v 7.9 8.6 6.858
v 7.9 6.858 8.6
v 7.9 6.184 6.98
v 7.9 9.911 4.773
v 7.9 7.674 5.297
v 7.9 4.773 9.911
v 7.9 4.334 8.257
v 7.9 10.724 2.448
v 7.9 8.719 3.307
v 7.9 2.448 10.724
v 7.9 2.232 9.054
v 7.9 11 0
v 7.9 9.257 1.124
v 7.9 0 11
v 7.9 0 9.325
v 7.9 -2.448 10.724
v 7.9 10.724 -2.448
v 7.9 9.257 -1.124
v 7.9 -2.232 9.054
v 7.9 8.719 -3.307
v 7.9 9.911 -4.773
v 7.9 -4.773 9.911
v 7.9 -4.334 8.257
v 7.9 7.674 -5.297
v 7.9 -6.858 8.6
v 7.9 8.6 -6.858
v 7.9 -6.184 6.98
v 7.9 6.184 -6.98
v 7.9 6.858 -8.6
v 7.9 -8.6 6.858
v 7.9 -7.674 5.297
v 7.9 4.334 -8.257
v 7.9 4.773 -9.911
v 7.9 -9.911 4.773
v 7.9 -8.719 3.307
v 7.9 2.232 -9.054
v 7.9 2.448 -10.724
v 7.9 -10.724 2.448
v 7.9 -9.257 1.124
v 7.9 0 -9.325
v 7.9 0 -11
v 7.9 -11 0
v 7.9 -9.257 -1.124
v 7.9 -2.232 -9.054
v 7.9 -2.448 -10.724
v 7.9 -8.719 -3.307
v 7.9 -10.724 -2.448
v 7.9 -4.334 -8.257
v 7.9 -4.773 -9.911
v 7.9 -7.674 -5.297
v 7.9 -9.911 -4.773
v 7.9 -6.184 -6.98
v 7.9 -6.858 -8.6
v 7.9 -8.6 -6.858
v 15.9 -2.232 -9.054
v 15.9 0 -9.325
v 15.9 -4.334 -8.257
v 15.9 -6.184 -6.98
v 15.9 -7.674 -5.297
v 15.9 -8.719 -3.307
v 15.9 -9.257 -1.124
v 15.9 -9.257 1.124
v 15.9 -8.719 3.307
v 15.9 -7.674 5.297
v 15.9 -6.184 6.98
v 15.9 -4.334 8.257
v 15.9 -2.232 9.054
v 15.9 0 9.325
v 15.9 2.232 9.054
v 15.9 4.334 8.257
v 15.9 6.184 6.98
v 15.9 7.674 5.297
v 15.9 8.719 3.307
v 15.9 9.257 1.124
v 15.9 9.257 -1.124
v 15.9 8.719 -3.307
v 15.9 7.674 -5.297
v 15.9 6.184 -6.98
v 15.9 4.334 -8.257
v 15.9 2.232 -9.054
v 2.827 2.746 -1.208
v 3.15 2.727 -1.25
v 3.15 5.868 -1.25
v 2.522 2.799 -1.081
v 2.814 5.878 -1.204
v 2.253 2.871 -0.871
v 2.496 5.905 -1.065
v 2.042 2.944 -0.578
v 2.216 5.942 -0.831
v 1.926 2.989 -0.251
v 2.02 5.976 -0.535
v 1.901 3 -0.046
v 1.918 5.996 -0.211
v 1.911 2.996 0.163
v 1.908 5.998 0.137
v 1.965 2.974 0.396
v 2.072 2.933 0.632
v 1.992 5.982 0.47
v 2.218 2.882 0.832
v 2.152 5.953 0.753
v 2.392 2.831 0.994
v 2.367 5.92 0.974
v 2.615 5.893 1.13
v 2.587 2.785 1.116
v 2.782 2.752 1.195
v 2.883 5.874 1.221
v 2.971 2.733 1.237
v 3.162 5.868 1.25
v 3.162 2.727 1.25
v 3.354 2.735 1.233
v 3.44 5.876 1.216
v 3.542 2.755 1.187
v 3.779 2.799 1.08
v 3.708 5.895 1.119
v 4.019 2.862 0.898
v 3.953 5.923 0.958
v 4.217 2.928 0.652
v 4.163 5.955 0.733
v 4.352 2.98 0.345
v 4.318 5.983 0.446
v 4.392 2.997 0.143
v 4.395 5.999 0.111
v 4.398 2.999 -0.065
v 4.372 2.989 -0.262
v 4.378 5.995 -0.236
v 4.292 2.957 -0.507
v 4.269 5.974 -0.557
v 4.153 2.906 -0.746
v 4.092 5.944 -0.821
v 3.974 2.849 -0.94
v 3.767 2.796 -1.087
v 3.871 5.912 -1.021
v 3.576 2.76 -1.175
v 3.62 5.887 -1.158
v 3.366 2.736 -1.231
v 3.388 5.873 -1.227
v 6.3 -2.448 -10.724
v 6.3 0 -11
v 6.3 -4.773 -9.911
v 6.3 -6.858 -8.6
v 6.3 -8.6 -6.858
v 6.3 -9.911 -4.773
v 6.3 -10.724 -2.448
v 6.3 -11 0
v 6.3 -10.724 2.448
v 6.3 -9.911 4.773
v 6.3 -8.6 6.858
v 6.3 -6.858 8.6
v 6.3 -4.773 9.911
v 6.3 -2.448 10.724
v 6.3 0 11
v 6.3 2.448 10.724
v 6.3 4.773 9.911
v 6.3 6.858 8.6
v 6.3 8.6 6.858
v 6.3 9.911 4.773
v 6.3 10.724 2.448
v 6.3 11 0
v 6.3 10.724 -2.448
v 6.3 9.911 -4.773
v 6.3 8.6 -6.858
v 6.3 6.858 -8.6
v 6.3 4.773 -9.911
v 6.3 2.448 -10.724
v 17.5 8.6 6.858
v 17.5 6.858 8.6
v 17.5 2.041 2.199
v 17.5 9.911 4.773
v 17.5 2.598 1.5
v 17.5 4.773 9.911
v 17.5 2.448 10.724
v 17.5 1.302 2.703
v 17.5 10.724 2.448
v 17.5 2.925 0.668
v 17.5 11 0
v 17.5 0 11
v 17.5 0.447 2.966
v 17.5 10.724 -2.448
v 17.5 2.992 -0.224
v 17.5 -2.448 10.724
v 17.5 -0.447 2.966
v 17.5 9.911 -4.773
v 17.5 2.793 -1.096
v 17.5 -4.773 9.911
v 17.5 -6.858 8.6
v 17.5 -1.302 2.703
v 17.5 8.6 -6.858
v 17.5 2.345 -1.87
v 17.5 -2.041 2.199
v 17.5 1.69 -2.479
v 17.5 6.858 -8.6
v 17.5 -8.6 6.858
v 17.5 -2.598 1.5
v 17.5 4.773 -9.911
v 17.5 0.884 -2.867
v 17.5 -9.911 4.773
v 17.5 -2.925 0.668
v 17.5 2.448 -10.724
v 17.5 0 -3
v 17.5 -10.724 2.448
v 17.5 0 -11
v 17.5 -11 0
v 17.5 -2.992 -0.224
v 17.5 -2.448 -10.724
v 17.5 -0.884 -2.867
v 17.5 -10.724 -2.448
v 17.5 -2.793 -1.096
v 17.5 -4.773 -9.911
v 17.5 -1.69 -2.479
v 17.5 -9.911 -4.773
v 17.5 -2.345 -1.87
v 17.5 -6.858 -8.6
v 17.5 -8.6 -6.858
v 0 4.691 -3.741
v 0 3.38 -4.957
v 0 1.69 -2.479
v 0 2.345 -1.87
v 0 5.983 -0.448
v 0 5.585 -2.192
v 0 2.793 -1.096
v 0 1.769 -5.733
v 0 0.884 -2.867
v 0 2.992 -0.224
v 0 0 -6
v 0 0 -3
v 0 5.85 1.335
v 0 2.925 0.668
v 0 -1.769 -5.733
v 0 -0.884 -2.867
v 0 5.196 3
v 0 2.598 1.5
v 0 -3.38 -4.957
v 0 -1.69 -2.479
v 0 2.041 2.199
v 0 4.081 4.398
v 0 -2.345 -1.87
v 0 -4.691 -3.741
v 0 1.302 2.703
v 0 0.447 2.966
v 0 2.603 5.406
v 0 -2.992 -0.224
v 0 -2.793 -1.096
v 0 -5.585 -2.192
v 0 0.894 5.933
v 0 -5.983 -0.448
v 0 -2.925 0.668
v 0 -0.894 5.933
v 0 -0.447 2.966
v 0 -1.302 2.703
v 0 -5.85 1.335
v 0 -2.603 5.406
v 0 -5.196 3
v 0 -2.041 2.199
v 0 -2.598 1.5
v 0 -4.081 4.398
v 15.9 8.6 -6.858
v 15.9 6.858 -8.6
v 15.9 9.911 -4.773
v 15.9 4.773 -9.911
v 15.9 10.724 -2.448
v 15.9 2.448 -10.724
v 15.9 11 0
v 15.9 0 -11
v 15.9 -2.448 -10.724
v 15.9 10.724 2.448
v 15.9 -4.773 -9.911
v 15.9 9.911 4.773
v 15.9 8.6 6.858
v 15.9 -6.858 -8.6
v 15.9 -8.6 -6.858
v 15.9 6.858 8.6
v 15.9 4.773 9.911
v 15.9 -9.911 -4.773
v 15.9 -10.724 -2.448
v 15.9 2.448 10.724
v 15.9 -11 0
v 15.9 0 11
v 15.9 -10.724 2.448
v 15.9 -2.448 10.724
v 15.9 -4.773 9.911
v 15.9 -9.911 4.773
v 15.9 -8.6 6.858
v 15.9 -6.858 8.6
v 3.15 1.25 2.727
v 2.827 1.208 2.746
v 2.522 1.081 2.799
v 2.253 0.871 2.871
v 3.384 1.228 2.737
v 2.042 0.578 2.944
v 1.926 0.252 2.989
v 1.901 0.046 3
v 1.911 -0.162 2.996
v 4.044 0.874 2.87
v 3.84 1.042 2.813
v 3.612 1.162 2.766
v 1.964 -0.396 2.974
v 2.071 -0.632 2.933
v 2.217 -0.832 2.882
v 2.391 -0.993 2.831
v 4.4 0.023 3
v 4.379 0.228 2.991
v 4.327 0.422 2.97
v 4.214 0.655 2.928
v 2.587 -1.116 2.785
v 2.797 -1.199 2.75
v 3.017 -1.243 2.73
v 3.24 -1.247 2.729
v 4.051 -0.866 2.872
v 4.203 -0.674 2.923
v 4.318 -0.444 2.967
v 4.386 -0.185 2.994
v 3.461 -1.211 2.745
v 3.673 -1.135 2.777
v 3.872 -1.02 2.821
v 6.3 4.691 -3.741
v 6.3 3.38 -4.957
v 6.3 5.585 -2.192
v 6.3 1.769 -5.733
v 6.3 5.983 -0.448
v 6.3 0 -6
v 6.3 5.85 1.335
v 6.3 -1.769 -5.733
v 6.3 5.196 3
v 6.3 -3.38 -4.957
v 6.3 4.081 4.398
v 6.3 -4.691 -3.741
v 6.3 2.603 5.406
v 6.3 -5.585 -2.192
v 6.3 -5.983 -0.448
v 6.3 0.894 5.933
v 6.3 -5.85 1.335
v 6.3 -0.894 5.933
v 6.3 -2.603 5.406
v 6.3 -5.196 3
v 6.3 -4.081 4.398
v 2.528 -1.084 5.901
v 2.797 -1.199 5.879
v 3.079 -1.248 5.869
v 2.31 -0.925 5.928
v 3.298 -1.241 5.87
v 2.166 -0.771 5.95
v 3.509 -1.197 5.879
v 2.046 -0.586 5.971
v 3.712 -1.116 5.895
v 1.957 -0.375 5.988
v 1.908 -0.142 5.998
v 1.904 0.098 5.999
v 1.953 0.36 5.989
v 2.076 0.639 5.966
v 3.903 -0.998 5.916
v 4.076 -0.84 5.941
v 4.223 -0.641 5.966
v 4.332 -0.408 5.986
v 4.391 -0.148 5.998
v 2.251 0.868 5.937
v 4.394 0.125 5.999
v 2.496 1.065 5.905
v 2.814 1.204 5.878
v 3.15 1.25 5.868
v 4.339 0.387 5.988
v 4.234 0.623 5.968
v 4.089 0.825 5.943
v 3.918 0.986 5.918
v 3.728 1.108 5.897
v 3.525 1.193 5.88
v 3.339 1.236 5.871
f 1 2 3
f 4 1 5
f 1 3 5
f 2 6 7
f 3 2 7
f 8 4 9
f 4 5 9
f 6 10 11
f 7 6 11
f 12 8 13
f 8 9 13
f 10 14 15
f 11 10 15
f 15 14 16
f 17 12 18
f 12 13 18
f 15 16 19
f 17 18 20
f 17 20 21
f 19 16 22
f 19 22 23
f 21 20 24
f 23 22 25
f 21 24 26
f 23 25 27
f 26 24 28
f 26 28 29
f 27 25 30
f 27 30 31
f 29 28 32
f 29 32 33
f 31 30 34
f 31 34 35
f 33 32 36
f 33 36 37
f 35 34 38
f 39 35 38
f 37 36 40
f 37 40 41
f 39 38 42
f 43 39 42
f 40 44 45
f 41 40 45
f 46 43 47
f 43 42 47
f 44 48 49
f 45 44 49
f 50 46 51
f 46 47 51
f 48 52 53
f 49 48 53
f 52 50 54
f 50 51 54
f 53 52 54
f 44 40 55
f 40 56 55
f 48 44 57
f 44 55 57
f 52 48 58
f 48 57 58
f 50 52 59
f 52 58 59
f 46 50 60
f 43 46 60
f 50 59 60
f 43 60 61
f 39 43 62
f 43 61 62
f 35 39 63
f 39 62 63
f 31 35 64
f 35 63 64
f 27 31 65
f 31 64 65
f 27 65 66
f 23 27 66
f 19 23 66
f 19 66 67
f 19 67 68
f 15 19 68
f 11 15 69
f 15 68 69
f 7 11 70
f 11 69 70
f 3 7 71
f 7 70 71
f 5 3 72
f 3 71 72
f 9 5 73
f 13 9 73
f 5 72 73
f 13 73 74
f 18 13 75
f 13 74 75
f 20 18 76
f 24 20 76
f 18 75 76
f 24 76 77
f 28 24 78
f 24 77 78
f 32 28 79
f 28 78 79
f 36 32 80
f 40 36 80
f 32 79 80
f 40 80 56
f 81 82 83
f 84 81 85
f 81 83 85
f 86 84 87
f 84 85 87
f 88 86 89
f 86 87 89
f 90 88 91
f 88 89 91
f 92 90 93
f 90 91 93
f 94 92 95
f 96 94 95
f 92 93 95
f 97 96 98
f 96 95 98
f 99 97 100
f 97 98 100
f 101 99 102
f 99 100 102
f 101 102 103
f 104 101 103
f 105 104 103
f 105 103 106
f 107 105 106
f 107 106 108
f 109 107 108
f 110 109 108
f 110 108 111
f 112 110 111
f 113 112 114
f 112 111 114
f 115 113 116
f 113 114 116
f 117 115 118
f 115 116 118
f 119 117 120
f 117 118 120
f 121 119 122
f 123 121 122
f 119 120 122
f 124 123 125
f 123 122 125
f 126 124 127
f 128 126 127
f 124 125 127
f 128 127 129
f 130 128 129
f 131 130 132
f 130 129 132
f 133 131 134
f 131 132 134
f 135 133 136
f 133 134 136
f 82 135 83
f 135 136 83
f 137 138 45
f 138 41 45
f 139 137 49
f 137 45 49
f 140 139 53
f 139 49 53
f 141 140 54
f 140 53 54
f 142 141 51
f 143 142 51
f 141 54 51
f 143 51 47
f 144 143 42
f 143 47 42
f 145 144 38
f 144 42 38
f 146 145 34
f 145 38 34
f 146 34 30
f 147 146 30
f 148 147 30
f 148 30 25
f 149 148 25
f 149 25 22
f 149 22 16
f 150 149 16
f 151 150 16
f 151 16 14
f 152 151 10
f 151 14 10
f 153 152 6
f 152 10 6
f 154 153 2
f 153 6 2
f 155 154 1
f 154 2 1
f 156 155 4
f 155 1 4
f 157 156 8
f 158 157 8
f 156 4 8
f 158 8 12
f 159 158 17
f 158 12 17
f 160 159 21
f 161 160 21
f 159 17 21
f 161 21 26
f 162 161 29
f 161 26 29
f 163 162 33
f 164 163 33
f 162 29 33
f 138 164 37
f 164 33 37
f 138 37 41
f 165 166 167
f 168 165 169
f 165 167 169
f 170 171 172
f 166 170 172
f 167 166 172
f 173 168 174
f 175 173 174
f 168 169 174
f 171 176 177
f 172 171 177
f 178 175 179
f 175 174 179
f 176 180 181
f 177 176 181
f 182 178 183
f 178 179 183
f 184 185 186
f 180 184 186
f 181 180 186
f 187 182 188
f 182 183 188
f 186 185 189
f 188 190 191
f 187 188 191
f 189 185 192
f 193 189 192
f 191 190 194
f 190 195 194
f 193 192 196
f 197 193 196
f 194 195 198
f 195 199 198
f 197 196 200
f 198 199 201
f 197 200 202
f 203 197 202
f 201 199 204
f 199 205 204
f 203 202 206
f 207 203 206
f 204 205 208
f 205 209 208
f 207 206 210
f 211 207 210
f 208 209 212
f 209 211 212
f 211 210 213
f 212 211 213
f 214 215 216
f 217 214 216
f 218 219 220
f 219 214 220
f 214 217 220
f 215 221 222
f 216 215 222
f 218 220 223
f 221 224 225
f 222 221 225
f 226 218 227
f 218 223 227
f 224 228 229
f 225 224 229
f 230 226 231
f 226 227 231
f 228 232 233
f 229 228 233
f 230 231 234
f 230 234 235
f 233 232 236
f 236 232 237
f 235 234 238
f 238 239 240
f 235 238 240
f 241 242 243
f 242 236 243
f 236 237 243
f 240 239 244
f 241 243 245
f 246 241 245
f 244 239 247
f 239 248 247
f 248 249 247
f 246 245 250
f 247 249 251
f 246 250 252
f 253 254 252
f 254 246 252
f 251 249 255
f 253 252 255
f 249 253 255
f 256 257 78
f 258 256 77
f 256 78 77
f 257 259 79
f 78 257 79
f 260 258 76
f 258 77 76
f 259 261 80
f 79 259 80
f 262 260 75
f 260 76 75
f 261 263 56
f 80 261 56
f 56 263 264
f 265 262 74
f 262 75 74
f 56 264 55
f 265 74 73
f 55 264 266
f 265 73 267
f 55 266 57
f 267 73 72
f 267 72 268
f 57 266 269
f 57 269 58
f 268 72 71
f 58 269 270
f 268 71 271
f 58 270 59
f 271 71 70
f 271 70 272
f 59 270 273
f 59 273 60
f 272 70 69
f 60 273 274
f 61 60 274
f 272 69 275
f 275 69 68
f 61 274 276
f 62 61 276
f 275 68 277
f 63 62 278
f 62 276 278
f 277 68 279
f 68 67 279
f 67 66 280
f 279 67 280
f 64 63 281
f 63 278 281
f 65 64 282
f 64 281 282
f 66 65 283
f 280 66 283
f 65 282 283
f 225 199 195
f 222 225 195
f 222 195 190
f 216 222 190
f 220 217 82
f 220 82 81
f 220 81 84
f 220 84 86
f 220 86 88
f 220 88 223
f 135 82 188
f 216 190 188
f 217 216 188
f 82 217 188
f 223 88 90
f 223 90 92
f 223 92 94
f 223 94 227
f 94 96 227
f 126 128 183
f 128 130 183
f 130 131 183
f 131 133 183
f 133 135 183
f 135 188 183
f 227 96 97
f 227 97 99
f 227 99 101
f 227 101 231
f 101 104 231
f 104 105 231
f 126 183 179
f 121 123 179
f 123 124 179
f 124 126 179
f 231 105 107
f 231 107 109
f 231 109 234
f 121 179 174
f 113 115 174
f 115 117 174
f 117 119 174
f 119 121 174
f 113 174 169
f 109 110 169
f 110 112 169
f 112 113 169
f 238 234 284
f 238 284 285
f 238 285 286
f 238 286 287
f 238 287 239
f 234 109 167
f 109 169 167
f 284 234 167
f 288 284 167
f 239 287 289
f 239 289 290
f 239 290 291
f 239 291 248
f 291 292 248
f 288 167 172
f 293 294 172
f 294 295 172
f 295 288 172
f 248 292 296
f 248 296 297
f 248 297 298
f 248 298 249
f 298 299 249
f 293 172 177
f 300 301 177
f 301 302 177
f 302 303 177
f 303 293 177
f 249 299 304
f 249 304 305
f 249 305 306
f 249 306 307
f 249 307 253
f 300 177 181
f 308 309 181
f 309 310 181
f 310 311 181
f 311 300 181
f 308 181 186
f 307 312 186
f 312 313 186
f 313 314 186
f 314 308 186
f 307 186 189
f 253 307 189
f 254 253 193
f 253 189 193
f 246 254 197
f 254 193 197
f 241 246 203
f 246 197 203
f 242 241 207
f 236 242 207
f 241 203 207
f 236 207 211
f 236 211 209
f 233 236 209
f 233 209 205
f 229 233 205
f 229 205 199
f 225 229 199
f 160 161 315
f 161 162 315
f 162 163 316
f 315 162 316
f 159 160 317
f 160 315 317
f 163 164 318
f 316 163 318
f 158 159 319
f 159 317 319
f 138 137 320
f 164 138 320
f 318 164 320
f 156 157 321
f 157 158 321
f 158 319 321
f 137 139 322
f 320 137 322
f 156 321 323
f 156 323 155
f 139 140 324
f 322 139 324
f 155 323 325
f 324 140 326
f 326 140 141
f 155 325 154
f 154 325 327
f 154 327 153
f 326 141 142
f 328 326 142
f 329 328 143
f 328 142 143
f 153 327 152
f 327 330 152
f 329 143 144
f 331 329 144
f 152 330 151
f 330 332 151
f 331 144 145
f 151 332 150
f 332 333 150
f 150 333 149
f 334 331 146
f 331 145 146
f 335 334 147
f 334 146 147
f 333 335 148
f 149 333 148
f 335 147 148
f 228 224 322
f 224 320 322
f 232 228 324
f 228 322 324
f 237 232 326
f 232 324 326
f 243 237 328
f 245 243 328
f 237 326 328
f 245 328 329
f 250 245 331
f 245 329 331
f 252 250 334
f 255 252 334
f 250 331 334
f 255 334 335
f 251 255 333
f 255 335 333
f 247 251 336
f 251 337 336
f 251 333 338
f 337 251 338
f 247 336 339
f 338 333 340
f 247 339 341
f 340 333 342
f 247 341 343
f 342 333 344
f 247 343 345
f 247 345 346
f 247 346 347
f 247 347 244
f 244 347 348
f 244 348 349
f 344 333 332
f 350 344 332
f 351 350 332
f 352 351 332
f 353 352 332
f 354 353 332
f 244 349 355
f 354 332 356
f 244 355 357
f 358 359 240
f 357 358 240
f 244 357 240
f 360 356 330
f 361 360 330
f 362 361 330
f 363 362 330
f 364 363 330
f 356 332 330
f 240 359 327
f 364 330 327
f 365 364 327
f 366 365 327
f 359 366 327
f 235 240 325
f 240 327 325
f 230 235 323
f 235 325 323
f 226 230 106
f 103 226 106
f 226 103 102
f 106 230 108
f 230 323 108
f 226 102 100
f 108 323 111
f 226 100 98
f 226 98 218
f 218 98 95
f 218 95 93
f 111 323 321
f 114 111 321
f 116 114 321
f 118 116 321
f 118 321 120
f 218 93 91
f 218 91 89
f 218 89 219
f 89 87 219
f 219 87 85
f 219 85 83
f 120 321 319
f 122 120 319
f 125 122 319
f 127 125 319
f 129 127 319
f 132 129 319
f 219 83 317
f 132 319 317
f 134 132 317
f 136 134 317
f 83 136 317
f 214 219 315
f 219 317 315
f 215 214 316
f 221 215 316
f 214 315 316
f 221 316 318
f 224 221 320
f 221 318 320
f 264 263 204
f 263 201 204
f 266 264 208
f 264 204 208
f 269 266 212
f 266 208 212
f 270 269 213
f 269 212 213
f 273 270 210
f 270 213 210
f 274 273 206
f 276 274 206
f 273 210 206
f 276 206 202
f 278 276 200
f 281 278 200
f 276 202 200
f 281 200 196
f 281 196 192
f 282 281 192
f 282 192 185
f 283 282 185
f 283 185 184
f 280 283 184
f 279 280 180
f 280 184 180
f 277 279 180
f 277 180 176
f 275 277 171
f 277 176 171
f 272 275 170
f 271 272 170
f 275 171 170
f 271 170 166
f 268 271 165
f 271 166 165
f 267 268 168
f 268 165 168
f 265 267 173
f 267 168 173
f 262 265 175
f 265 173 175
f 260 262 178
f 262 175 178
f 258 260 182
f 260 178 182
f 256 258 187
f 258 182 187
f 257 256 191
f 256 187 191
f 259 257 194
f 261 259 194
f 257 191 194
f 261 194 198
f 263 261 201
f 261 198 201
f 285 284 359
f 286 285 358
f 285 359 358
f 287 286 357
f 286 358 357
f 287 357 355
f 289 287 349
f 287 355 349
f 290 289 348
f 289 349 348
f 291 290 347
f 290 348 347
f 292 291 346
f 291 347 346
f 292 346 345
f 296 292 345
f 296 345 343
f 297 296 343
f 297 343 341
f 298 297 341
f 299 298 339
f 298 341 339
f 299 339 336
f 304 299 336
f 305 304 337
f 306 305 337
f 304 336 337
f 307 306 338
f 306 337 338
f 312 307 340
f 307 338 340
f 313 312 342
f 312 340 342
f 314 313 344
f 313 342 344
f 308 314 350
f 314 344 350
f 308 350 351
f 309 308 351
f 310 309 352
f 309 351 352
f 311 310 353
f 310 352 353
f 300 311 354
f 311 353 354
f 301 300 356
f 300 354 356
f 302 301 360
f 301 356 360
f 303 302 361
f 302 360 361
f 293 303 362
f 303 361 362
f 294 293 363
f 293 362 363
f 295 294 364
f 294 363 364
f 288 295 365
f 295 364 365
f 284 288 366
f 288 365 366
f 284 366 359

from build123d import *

# Parameters (mm, degrees)
SKETCH2_W          = 1.25
SKETCH2_H          = 11
SKETCH4_W          = 1.25
SKETCH4_H          = 11
SKETCH6_R          = 3
CUT_EXTRUDE1_DEPTH = 24.414739023


with BuildPart() as part:
    # Sketch1 → Revolve1 (revolve)
    with BuildSketch(Plane.XY, mode=Mode.PRIVATE) as revolve1_sk:
        Polygon((0, 2.5), (0, 6), (6.3, 6), (6.3, 11), (7.9, 11), (7.9, 9.325), (15.9, 9.325), (15.9, 11), (17.5, 11), (17.5, 2.5), align=None)
    revolve(revolve1_sk.sketch.rotate(Axis((0, 0, 0), (-1, 0, 0)), 90), axis=Axis((0, 0, 0), (-1, 0, 0)))

    # Sketch2 → M3x0.5 Tapped Hole1 (revolve, cut)
    with BuildSketch(Plane(origin=(3.15, 0, 0), x_dir=(0, 0, -1), z_dir=(1, 0, 0))):
        with Locations((0.625, 5.5)):
            Rectangle(SKETCH2_W, SKETCH2_H)
    revolve(axis=Axis((3.15, -6.35, 0), (0, 1, 0)), mode=Mode.SUBTRACT)

    # Sketch4 → M3x0.5 Tapped Hole2 (revolve, cut)
    with BuildSketch(Plane.YZ.offset(3.15)):
        with Locations((0.625, 5.5)):
            Rectangle(SKETCH4_W, SKETCH4_H)
    revolve(axis=Axis((3.15, 0, -6.35), (0, 0, 1)), mode=Mode.SUBTRACT)

    # Sketch6 → Cut-Extrude1 (cut, through all)
    with BuildSketch(Plane(origin=(17.5, 0, 0), x_dir=(0, 0, -1), z_dir=(1, 0, 0))):
        Circle(SKETCH6_R)
    extrude(amount=-CUT_EXTRUDE1_DEPTH, mode=Mode.SUBTRACT)


solid = part.part
